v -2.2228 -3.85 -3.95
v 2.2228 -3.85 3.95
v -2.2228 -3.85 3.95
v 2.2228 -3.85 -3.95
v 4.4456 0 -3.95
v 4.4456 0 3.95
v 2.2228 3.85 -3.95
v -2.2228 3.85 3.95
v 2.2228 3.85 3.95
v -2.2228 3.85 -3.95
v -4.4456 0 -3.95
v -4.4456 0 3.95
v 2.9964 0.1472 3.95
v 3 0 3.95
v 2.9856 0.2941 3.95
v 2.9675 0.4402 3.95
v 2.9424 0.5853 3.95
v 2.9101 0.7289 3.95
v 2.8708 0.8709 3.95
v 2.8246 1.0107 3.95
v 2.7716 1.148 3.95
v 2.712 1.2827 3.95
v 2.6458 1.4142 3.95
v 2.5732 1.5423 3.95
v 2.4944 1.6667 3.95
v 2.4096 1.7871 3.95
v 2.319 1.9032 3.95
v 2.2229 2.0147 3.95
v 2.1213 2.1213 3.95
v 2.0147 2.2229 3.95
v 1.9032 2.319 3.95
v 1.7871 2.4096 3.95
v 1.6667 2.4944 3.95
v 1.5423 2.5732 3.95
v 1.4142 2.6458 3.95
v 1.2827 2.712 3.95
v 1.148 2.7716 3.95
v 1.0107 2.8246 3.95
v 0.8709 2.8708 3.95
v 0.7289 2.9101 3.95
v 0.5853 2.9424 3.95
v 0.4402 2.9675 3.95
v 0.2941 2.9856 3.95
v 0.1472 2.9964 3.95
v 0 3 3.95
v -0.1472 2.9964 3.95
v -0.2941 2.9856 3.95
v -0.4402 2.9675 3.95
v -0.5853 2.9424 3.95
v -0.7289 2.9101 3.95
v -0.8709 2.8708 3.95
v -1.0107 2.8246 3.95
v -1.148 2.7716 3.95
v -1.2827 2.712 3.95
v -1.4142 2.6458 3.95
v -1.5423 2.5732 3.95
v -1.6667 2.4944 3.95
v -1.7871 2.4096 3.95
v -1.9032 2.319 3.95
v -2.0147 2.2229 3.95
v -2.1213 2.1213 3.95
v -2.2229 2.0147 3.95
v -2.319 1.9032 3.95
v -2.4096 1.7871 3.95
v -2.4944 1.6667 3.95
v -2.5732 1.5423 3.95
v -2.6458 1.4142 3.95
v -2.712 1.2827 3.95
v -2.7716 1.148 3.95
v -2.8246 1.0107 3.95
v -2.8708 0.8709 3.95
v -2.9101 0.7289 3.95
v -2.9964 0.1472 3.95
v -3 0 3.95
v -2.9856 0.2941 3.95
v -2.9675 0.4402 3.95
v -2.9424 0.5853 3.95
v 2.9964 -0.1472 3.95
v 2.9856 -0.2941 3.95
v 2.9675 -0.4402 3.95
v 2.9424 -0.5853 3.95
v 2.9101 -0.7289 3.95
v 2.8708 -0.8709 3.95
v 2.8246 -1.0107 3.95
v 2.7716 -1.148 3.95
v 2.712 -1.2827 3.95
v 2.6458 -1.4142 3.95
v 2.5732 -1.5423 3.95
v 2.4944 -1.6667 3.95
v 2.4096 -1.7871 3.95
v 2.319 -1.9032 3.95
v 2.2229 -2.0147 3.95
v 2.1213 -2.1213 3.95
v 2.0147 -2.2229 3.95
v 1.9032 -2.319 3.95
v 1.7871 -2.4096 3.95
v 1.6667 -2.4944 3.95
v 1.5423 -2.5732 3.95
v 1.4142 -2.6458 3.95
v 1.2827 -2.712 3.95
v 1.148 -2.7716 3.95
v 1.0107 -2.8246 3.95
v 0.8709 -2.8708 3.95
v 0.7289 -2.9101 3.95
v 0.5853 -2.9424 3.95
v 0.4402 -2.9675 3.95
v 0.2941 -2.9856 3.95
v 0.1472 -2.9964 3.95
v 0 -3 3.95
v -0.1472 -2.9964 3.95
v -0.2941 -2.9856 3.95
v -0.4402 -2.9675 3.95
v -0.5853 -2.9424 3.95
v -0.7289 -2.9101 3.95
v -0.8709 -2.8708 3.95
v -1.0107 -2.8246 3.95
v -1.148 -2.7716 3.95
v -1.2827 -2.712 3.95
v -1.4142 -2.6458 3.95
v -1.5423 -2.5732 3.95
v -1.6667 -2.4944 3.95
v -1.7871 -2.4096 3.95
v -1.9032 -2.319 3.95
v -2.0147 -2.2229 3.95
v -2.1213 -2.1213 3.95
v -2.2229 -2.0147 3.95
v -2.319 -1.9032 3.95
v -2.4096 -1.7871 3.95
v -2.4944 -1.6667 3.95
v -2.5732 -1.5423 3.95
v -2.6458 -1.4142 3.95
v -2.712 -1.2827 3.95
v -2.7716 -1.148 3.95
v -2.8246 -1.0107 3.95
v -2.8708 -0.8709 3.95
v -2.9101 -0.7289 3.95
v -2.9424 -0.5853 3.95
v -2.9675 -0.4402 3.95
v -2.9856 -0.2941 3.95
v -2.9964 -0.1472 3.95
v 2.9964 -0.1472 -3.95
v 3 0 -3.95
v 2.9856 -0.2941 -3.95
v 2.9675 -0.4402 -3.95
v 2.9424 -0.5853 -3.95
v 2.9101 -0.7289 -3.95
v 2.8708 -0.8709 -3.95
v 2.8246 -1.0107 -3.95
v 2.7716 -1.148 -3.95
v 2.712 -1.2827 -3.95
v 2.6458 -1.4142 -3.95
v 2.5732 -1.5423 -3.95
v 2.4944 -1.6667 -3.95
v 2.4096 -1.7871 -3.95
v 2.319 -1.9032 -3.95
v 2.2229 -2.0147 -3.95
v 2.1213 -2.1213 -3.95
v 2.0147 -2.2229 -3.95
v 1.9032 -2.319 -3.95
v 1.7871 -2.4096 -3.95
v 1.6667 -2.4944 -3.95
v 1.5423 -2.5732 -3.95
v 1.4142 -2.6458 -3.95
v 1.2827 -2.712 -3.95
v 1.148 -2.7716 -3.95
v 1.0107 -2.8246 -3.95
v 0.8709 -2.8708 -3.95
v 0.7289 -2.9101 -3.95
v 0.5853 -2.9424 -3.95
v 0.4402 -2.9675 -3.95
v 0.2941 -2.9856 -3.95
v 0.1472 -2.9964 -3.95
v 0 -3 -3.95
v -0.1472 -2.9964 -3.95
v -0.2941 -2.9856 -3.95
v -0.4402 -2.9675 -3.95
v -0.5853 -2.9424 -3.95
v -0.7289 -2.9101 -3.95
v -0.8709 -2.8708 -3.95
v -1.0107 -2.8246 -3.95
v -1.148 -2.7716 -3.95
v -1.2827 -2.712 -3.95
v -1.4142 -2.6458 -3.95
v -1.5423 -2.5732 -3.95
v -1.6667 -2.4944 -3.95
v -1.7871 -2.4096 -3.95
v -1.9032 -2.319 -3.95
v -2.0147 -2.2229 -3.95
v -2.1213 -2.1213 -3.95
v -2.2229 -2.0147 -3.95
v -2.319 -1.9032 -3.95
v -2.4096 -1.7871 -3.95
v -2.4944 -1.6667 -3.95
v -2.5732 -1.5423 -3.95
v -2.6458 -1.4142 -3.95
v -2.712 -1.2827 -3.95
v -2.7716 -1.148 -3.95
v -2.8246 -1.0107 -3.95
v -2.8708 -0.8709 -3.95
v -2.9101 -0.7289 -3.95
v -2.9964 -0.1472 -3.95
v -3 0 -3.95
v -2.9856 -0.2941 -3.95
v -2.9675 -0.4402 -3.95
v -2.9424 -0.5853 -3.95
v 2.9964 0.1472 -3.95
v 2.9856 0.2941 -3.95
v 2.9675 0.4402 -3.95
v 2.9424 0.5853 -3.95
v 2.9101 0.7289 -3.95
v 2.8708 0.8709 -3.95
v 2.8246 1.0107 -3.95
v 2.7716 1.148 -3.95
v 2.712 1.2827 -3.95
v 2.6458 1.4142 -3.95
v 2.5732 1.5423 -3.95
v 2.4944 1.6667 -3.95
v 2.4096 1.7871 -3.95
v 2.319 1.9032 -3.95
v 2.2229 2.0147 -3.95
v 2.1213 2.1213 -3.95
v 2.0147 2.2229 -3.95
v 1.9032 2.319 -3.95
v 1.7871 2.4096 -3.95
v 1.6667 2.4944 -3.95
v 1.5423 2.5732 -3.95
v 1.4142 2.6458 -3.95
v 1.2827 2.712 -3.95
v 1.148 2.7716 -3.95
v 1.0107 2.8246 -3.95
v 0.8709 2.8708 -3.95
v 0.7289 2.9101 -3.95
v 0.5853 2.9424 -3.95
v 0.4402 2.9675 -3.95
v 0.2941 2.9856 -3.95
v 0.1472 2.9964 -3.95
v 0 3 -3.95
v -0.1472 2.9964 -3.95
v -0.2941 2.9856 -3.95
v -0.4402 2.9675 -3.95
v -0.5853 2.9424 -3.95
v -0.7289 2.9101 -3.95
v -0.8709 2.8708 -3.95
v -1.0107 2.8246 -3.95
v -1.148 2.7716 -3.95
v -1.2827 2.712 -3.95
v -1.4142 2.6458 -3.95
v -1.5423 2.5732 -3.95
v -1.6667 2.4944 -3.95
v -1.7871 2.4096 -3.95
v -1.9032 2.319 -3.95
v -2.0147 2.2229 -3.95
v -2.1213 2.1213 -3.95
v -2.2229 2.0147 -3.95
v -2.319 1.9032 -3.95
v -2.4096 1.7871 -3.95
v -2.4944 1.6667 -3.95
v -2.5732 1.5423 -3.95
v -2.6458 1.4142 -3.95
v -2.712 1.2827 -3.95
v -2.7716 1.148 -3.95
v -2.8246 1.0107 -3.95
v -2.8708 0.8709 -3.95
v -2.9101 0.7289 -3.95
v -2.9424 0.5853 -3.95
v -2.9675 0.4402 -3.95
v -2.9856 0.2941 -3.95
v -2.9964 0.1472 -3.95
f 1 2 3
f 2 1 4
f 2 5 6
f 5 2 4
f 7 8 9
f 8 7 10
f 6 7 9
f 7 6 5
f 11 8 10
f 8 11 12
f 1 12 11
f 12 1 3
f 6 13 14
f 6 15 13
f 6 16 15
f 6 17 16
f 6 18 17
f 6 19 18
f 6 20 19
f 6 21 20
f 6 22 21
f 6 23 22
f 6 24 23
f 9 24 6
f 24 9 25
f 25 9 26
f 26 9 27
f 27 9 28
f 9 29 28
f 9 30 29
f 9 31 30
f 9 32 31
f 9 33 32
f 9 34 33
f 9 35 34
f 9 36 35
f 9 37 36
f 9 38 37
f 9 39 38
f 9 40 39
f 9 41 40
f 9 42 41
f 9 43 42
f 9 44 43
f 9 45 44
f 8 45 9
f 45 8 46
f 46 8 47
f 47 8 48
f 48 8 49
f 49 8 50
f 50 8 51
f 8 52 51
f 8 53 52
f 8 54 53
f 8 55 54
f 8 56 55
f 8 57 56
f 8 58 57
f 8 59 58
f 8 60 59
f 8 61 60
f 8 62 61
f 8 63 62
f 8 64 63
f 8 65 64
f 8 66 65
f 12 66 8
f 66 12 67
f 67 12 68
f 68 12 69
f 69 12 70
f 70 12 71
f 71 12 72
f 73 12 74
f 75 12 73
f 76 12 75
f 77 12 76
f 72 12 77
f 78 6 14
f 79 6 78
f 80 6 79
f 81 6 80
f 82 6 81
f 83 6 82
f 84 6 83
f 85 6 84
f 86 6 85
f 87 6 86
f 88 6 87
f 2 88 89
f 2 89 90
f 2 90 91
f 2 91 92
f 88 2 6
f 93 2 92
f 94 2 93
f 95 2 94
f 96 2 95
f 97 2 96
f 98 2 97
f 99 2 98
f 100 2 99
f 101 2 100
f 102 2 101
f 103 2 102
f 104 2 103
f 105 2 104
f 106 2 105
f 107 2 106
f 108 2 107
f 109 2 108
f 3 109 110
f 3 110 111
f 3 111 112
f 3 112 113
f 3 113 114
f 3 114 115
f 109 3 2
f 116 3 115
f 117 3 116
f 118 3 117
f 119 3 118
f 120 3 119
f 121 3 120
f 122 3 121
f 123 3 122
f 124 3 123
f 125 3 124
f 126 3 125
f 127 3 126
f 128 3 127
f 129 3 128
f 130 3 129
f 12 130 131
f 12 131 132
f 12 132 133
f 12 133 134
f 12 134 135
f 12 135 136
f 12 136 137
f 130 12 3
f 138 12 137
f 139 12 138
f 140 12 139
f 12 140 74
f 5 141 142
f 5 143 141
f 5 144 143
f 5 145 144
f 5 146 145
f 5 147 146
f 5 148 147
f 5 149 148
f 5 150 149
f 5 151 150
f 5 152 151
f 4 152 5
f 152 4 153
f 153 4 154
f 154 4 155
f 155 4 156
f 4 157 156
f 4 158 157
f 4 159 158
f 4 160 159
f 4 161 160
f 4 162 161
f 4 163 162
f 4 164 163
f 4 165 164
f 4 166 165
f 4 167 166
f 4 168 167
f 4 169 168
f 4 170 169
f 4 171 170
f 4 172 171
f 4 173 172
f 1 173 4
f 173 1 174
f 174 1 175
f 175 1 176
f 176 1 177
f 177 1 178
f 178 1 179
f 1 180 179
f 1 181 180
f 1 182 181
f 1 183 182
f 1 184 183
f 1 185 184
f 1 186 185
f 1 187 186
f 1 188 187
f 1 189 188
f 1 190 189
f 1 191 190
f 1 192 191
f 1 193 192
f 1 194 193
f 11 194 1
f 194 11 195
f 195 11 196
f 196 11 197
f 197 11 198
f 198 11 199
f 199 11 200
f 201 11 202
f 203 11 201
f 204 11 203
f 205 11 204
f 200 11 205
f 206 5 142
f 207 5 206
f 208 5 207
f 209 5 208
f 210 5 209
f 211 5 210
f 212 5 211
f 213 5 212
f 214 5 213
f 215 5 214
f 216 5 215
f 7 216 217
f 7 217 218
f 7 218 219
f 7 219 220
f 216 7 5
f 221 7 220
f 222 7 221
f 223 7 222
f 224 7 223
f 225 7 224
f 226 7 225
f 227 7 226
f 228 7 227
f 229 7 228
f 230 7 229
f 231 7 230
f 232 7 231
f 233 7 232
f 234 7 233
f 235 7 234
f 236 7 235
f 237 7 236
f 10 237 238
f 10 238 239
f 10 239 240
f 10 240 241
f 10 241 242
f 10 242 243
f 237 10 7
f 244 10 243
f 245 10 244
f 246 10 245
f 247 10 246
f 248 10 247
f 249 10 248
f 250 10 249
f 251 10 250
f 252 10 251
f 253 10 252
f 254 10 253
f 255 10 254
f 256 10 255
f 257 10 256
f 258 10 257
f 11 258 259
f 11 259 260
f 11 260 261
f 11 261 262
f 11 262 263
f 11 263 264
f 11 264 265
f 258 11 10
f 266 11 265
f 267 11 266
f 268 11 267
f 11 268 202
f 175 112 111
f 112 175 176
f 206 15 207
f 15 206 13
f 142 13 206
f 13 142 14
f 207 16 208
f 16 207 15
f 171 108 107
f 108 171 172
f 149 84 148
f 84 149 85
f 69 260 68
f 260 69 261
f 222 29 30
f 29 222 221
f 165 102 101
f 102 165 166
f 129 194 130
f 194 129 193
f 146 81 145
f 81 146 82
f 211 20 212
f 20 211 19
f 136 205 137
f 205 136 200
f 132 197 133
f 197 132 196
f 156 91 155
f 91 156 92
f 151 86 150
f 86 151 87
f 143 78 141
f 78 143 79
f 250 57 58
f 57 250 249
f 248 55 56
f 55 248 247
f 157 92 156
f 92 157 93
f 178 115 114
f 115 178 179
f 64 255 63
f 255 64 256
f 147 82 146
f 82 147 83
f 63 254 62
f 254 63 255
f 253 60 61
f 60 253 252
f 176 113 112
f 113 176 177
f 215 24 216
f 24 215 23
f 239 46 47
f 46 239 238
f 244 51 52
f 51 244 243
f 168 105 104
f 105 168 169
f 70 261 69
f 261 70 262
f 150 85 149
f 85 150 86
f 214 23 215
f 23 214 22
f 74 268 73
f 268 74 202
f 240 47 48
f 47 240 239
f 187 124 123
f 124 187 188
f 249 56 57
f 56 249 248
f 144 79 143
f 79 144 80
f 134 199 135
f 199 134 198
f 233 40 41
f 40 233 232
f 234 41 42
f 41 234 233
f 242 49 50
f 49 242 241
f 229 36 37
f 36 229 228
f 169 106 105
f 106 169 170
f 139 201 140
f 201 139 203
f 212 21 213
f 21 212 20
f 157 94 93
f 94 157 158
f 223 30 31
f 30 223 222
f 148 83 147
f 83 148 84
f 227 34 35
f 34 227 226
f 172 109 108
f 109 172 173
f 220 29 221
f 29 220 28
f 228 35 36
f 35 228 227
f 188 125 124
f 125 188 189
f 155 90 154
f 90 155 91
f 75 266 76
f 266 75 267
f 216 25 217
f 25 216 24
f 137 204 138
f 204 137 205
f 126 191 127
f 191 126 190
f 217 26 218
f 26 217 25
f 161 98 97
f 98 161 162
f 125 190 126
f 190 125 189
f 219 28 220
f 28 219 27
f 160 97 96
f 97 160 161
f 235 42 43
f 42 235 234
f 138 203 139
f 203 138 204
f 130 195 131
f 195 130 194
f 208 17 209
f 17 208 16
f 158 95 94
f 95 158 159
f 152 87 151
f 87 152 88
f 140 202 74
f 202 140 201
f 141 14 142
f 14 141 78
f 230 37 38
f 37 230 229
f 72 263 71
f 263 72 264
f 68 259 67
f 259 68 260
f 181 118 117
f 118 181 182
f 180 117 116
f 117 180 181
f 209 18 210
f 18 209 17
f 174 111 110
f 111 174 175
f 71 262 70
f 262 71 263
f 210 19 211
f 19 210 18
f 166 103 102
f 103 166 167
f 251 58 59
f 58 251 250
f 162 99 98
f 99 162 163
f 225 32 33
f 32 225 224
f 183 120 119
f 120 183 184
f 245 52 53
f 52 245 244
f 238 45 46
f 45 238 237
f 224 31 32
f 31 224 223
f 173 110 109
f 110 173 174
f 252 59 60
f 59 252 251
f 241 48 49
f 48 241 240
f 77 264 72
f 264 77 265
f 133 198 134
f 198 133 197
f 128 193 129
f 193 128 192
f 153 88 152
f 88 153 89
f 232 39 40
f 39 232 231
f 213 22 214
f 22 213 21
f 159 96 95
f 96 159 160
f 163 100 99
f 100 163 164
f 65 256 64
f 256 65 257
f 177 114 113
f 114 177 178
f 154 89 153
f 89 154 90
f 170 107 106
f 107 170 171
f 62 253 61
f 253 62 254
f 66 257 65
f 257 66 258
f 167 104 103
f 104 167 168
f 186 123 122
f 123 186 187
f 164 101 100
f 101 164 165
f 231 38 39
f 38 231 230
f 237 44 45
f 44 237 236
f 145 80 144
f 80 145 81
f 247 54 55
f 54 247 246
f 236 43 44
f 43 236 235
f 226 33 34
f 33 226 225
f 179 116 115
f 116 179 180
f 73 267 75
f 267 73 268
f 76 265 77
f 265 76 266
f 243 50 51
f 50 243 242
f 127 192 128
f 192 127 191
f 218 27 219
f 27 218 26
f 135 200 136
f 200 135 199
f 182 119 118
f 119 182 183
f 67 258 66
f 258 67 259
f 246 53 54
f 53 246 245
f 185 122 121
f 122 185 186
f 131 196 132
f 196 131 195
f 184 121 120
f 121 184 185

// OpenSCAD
// Hex nut: 6.0 mm screw, 7.7 mm across flats, 7.9 mm thick

thread_nominal_diameter_mm = 6.0;   //[3:12:0.1]
across_flats_mm            = 7.7;   //[4:16:0.1]
thickness_mm               = 7.9;   //[4:16:0.1]
tolerance_mm               = 0.0;   //[-0.5:0.8:0.05]
eps_mm                     = 0.2;   //[0.01:1:0.01]

// For a regular hex made with cylinder($fn=6), OpenSCAD's r is the circumradius.
// Across-flats (AF) = sqrt(3) * r  =>  r = AF / sqrt(3)
hex_circumradius_mm = across_flats_mm / sqrt(3);

module hex_nut() {
    hole_r = (thread_nominal_diameter_mm + tolerance_mm) / 2;

    difference() {
        // Hex body (one connected solid)
        cylinder(r = hex_circumradius_mm, h = thickness_mm, center = true, $fn = 6);

        // Through-hole: extend beyond both faces to guarantee a clean cut in all views
        translate([0, 0, 0])
            cylinder(r = hole_r, h = thickness_mm + 2*eps_mm, center = true, $fn = 128);
    }
}

hex_nut();
